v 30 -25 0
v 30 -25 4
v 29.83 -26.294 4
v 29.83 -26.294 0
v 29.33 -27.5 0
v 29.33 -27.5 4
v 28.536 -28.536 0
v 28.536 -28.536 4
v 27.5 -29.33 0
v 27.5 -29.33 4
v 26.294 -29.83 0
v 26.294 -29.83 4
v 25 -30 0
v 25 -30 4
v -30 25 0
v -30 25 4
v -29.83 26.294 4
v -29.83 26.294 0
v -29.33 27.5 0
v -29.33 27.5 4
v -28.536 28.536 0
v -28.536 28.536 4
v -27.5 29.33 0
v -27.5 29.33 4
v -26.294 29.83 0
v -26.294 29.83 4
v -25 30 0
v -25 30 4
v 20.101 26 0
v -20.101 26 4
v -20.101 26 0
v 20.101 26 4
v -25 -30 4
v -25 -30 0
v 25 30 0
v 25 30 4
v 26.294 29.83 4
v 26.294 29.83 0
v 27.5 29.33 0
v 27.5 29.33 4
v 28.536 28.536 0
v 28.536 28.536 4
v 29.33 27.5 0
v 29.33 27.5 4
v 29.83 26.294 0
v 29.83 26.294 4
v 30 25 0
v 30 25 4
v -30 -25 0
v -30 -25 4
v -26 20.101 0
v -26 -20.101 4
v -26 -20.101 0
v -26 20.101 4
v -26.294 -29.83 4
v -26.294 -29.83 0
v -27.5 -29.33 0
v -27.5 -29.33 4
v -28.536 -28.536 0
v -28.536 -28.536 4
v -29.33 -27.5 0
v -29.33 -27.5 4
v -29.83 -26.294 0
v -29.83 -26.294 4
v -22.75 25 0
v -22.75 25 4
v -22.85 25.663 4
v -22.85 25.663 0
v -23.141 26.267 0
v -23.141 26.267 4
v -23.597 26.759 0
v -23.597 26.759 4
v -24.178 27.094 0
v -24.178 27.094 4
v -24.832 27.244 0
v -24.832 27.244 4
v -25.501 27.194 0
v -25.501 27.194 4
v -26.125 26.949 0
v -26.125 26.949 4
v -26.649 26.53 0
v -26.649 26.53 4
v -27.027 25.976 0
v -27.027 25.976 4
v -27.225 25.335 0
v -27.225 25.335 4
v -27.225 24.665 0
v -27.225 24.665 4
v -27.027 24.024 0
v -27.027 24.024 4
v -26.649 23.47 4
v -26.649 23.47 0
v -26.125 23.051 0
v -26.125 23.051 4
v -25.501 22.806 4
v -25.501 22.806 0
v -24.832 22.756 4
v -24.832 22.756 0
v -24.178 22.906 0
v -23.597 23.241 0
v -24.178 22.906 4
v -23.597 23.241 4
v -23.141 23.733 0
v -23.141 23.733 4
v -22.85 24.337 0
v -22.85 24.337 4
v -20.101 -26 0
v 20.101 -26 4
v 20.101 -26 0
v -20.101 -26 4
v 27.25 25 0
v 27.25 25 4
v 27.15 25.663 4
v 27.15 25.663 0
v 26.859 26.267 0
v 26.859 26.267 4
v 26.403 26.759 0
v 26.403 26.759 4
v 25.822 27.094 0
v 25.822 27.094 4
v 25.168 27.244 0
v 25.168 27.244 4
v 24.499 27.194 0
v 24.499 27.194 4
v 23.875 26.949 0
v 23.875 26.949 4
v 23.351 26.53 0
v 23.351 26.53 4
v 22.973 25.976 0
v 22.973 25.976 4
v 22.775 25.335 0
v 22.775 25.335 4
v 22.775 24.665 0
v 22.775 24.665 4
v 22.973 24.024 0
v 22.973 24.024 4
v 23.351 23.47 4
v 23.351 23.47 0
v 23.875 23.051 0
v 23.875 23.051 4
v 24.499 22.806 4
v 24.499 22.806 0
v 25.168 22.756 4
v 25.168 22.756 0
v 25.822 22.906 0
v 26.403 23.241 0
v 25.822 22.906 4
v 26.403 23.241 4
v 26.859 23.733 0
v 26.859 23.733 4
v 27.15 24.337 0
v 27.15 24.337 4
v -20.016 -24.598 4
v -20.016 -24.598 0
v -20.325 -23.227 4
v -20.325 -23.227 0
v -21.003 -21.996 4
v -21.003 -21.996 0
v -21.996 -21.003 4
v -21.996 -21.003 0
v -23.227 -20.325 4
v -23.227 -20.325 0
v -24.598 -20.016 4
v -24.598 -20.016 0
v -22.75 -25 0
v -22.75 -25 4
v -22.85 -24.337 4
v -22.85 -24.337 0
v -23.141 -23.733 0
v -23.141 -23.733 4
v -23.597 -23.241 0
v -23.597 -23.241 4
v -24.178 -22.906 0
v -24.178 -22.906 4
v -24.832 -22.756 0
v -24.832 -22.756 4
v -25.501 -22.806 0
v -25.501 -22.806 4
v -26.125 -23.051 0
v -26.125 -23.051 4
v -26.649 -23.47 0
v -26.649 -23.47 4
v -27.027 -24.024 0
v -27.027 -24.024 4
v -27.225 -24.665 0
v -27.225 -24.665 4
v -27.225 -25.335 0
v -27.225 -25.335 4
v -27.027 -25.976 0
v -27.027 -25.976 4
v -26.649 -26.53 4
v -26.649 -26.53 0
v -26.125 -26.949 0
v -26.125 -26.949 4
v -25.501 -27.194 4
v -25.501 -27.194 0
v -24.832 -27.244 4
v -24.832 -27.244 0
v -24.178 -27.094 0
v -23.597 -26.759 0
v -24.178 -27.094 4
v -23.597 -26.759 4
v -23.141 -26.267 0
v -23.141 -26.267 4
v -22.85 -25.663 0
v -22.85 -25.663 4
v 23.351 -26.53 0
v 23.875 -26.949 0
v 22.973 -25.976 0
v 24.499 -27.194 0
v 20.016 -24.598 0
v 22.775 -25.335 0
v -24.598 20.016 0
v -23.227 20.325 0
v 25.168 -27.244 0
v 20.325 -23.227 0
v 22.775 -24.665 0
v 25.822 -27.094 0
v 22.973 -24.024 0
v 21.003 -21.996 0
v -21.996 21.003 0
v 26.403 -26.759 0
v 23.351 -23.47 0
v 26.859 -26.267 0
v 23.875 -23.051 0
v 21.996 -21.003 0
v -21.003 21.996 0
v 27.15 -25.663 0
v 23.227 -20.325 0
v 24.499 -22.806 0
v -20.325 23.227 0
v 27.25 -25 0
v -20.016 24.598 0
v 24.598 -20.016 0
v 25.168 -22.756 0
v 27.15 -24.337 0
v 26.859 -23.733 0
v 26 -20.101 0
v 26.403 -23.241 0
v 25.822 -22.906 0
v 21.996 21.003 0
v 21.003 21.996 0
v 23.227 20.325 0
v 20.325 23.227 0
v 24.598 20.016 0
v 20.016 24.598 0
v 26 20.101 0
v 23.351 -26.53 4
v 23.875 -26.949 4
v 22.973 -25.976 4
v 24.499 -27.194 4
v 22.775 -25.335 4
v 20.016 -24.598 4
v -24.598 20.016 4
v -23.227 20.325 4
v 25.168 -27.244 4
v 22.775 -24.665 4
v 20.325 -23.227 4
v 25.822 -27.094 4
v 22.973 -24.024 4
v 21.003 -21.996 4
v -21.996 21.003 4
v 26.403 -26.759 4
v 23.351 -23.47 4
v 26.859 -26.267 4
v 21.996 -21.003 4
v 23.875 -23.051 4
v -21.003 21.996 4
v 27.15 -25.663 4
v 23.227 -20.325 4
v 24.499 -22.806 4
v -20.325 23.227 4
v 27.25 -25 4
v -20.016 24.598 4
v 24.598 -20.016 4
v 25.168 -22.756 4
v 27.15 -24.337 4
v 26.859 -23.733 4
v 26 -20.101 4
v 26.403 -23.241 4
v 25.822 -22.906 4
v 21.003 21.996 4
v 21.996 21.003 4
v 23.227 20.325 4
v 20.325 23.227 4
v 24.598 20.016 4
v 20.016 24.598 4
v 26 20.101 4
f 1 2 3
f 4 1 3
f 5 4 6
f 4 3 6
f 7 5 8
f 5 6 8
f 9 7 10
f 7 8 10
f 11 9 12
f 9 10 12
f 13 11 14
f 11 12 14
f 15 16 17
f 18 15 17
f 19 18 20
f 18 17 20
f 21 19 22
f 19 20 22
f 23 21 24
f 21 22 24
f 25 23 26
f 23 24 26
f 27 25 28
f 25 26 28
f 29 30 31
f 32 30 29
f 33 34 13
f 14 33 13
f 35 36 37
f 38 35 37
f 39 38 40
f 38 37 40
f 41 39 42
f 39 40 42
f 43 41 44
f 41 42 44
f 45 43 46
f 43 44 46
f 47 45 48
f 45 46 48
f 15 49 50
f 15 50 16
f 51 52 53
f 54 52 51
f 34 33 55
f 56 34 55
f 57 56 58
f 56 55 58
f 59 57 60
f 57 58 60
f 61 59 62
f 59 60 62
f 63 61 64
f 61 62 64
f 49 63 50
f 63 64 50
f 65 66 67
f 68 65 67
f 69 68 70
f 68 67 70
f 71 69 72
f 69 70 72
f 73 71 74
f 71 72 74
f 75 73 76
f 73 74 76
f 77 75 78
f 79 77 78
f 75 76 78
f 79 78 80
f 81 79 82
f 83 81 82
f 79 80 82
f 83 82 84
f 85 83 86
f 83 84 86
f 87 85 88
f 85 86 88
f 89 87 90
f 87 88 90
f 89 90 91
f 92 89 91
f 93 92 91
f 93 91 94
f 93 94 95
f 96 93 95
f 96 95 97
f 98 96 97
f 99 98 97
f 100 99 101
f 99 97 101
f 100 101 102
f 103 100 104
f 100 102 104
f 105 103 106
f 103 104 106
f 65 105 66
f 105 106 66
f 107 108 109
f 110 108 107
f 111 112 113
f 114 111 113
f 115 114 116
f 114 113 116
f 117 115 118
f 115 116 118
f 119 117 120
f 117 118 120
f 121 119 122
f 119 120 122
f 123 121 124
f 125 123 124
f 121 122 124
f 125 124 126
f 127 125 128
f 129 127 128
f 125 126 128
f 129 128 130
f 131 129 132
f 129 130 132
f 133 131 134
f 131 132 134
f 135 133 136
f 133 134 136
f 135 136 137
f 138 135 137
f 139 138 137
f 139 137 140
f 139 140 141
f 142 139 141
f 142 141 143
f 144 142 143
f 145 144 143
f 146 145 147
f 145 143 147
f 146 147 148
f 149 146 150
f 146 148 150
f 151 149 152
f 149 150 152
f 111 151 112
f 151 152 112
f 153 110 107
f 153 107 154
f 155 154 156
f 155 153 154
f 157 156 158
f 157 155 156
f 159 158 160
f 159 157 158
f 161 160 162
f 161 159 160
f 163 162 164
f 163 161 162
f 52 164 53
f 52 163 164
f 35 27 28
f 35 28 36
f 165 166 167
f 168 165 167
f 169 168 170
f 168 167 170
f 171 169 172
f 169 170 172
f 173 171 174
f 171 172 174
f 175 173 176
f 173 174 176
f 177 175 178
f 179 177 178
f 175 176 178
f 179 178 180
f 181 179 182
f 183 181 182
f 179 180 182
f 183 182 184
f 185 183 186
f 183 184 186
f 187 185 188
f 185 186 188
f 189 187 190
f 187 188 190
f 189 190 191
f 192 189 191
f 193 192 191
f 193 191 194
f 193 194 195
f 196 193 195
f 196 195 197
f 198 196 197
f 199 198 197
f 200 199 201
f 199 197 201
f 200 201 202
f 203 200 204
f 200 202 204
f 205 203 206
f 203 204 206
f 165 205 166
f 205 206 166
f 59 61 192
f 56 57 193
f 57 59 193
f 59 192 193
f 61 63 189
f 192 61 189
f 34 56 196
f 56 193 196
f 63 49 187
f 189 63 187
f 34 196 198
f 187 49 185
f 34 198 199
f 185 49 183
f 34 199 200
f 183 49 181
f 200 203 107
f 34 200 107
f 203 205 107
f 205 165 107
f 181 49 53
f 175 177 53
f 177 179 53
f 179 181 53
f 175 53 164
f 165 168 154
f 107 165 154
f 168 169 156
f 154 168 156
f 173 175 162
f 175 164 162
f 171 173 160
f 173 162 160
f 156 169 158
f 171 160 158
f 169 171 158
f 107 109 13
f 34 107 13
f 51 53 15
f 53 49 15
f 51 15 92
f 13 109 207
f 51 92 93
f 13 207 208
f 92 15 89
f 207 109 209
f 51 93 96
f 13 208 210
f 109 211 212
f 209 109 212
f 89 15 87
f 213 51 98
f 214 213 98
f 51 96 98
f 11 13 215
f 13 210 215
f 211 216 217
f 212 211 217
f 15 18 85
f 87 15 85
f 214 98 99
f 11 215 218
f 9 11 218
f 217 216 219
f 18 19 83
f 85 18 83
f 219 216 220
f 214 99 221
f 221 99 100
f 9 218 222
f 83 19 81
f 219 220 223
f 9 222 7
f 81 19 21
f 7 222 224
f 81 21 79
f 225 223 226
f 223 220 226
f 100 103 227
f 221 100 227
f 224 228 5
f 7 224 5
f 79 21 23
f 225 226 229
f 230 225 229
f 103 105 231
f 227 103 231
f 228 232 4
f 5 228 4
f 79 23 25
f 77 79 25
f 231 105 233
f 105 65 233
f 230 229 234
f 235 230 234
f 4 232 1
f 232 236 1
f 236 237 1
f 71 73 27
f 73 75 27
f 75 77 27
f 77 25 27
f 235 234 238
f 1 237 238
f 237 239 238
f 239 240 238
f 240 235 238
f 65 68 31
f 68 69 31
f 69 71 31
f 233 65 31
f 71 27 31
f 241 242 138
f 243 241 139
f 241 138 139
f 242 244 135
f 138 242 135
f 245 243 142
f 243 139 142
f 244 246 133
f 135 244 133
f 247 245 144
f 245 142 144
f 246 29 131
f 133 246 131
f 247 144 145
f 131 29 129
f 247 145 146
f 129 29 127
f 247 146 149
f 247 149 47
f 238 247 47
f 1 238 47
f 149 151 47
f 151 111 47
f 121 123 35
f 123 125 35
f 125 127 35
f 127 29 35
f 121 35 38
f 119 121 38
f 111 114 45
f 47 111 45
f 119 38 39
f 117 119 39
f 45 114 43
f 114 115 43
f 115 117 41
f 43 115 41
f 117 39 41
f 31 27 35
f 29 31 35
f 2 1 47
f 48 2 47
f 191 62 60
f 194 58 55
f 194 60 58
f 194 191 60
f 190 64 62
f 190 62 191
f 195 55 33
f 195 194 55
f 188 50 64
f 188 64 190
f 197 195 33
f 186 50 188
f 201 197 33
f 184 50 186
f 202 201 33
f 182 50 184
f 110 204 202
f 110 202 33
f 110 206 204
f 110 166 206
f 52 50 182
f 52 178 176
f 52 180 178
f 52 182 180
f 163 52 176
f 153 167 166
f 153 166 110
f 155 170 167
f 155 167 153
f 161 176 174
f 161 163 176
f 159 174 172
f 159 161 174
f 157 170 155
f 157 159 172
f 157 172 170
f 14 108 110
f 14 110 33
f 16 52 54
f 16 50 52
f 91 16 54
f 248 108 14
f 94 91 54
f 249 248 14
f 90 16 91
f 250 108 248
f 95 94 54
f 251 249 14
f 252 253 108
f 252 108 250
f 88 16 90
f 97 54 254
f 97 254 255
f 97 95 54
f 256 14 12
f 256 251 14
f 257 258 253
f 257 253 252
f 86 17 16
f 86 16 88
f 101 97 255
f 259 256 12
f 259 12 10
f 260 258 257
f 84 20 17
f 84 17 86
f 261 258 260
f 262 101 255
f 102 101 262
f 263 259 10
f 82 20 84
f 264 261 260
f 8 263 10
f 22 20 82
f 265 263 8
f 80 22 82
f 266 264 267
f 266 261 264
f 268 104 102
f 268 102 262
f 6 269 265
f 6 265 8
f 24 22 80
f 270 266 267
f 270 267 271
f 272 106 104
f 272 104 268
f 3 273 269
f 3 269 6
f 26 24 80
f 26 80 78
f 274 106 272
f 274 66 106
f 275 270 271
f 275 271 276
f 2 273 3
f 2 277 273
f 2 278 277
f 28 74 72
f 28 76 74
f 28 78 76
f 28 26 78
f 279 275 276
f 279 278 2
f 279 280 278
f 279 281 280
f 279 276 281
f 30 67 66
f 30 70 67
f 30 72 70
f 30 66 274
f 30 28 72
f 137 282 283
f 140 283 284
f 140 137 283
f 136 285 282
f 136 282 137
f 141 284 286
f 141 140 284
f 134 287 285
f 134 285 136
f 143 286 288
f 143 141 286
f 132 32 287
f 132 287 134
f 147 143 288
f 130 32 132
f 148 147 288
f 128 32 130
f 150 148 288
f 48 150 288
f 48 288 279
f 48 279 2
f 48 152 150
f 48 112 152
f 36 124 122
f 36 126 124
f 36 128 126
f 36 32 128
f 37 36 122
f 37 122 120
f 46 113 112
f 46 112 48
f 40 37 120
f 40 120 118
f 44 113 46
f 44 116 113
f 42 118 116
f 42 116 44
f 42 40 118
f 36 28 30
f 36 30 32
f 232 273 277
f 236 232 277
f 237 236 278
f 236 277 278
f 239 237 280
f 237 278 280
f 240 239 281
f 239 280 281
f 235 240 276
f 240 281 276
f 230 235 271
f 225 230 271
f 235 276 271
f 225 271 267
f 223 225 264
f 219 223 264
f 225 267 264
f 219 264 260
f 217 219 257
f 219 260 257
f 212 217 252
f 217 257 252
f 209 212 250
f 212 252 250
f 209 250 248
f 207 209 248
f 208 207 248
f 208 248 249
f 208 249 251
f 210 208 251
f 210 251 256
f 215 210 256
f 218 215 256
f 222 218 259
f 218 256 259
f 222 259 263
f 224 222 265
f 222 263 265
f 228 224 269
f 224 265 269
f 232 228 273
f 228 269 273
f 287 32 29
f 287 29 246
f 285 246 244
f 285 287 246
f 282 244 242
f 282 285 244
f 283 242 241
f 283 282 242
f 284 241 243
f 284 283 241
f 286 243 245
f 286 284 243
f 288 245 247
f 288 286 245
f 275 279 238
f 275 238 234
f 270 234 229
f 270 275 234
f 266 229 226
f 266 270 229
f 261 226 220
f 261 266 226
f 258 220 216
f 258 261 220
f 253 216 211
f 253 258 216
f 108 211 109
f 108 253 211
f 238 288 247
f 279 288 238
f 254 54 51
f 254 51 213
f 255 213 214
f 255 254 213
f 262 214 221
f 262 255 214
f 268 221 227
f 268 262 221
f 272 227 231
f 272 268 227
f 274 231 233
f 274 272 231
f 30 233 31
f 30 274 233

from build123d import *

# Parameters (mm, degrees)
SKETCH1_W           = 60
SKETCH1_H           = 60
BOSS_EXTRUDE1_DEPTH = 4
SKETCH2_R           = 2.25
CUT_EXTRUDE1_DEPTH  = 4
CUT_EXTRUDE2_DEPTH  = 4


with BuildPart() as part:
    # Sketch1 → Boss-Extrude1 (new body)
    with BuildSketch(Plane.XY):
        Rectangle(SKETCH1_W, SKETCH1_H)
    extrude(amount=BOSS_EXTRUDE1_DEPTH)

    # Sketch2 → Cut-Extrude1 (cut)
    with BuildSketch(Plane.XY.offset(4)):
        with Locations((-25, 25)):
            Circle(SKETCH2_R)
        with Locations((25, 25)):
            Circle(SKETCH2_R)
        with Locations((25, -25)):
            Circle(SKETCH2_R)
        with Locations((-25, -25)):
            Circle(SKETCH2_R)
    extrude(amount=-CUT_EXTRUDE1_DEPTH, mode=Mode.SUBTRACT)

    # Sketch3 → Cut-Extrude2 (cut)
    with BuildSketch(Plane.XY.offset(4)):
        with BuildLine():
            Line((-25, 30), (-30, 30))
            Line((-30, 30), (-30, 25))
            ThreePointArc((-30, 25), (-28.535533906, 28.535533906), (-25, 30))
        make_face()
        with BuildLine():
            ThreePointArc((20.101020514, 26), (21.464466094, 21.464466094), (26, 20.101020514))
            Line((26, 20.101020514), (26, -20.101020514))
            ThreePointArc((26, -20.101020514), (21.464466094, -21.464466094), (20.101020514, -26))
            Line((20.101020514, -26), (-20.101020514, -26))
            ThreePointArc((-20.101020514, -26), (-21.464466094, -21.464466094), (-26, -20.101020514))
            Line((-26, -20.101020514), (-26, 20.101020514))
            ThreePointArc((-26, 20.101020514), (-21.464466094, 21.464466094), (-20.101020514, 26))
            Line((-20.101020514, 26), (20.101020514, 26))
        make_face()
        with BuildLine():
            Line((30, 30), (25, 30))
            ThreePointArc((25, 30), (28.535533906, 28.535533906), (30, 25))
            Line((30, 25), (30, 30))
        make_face()
        with BuildLine():
            ThreePointArc((30, -25), (28.535533906, -28.535533906), (25, -30))
            Line((25, -30), (30, -30))
            Line((30, -30), (30, -25))
        make_face()
        with BuildLine():
            ThreePointArc((-25, -30), (-28.535533906, -28.535533906), (-30, -25))
            Line((-30, -25), (-30, -30))
            Line((-30, -30), (-25, -30))
        make_face()
    extrude(amount=-CUT_EXTRUDE2_DEPTH, mode=Mode.SUBTRACT)


solid = part.part
